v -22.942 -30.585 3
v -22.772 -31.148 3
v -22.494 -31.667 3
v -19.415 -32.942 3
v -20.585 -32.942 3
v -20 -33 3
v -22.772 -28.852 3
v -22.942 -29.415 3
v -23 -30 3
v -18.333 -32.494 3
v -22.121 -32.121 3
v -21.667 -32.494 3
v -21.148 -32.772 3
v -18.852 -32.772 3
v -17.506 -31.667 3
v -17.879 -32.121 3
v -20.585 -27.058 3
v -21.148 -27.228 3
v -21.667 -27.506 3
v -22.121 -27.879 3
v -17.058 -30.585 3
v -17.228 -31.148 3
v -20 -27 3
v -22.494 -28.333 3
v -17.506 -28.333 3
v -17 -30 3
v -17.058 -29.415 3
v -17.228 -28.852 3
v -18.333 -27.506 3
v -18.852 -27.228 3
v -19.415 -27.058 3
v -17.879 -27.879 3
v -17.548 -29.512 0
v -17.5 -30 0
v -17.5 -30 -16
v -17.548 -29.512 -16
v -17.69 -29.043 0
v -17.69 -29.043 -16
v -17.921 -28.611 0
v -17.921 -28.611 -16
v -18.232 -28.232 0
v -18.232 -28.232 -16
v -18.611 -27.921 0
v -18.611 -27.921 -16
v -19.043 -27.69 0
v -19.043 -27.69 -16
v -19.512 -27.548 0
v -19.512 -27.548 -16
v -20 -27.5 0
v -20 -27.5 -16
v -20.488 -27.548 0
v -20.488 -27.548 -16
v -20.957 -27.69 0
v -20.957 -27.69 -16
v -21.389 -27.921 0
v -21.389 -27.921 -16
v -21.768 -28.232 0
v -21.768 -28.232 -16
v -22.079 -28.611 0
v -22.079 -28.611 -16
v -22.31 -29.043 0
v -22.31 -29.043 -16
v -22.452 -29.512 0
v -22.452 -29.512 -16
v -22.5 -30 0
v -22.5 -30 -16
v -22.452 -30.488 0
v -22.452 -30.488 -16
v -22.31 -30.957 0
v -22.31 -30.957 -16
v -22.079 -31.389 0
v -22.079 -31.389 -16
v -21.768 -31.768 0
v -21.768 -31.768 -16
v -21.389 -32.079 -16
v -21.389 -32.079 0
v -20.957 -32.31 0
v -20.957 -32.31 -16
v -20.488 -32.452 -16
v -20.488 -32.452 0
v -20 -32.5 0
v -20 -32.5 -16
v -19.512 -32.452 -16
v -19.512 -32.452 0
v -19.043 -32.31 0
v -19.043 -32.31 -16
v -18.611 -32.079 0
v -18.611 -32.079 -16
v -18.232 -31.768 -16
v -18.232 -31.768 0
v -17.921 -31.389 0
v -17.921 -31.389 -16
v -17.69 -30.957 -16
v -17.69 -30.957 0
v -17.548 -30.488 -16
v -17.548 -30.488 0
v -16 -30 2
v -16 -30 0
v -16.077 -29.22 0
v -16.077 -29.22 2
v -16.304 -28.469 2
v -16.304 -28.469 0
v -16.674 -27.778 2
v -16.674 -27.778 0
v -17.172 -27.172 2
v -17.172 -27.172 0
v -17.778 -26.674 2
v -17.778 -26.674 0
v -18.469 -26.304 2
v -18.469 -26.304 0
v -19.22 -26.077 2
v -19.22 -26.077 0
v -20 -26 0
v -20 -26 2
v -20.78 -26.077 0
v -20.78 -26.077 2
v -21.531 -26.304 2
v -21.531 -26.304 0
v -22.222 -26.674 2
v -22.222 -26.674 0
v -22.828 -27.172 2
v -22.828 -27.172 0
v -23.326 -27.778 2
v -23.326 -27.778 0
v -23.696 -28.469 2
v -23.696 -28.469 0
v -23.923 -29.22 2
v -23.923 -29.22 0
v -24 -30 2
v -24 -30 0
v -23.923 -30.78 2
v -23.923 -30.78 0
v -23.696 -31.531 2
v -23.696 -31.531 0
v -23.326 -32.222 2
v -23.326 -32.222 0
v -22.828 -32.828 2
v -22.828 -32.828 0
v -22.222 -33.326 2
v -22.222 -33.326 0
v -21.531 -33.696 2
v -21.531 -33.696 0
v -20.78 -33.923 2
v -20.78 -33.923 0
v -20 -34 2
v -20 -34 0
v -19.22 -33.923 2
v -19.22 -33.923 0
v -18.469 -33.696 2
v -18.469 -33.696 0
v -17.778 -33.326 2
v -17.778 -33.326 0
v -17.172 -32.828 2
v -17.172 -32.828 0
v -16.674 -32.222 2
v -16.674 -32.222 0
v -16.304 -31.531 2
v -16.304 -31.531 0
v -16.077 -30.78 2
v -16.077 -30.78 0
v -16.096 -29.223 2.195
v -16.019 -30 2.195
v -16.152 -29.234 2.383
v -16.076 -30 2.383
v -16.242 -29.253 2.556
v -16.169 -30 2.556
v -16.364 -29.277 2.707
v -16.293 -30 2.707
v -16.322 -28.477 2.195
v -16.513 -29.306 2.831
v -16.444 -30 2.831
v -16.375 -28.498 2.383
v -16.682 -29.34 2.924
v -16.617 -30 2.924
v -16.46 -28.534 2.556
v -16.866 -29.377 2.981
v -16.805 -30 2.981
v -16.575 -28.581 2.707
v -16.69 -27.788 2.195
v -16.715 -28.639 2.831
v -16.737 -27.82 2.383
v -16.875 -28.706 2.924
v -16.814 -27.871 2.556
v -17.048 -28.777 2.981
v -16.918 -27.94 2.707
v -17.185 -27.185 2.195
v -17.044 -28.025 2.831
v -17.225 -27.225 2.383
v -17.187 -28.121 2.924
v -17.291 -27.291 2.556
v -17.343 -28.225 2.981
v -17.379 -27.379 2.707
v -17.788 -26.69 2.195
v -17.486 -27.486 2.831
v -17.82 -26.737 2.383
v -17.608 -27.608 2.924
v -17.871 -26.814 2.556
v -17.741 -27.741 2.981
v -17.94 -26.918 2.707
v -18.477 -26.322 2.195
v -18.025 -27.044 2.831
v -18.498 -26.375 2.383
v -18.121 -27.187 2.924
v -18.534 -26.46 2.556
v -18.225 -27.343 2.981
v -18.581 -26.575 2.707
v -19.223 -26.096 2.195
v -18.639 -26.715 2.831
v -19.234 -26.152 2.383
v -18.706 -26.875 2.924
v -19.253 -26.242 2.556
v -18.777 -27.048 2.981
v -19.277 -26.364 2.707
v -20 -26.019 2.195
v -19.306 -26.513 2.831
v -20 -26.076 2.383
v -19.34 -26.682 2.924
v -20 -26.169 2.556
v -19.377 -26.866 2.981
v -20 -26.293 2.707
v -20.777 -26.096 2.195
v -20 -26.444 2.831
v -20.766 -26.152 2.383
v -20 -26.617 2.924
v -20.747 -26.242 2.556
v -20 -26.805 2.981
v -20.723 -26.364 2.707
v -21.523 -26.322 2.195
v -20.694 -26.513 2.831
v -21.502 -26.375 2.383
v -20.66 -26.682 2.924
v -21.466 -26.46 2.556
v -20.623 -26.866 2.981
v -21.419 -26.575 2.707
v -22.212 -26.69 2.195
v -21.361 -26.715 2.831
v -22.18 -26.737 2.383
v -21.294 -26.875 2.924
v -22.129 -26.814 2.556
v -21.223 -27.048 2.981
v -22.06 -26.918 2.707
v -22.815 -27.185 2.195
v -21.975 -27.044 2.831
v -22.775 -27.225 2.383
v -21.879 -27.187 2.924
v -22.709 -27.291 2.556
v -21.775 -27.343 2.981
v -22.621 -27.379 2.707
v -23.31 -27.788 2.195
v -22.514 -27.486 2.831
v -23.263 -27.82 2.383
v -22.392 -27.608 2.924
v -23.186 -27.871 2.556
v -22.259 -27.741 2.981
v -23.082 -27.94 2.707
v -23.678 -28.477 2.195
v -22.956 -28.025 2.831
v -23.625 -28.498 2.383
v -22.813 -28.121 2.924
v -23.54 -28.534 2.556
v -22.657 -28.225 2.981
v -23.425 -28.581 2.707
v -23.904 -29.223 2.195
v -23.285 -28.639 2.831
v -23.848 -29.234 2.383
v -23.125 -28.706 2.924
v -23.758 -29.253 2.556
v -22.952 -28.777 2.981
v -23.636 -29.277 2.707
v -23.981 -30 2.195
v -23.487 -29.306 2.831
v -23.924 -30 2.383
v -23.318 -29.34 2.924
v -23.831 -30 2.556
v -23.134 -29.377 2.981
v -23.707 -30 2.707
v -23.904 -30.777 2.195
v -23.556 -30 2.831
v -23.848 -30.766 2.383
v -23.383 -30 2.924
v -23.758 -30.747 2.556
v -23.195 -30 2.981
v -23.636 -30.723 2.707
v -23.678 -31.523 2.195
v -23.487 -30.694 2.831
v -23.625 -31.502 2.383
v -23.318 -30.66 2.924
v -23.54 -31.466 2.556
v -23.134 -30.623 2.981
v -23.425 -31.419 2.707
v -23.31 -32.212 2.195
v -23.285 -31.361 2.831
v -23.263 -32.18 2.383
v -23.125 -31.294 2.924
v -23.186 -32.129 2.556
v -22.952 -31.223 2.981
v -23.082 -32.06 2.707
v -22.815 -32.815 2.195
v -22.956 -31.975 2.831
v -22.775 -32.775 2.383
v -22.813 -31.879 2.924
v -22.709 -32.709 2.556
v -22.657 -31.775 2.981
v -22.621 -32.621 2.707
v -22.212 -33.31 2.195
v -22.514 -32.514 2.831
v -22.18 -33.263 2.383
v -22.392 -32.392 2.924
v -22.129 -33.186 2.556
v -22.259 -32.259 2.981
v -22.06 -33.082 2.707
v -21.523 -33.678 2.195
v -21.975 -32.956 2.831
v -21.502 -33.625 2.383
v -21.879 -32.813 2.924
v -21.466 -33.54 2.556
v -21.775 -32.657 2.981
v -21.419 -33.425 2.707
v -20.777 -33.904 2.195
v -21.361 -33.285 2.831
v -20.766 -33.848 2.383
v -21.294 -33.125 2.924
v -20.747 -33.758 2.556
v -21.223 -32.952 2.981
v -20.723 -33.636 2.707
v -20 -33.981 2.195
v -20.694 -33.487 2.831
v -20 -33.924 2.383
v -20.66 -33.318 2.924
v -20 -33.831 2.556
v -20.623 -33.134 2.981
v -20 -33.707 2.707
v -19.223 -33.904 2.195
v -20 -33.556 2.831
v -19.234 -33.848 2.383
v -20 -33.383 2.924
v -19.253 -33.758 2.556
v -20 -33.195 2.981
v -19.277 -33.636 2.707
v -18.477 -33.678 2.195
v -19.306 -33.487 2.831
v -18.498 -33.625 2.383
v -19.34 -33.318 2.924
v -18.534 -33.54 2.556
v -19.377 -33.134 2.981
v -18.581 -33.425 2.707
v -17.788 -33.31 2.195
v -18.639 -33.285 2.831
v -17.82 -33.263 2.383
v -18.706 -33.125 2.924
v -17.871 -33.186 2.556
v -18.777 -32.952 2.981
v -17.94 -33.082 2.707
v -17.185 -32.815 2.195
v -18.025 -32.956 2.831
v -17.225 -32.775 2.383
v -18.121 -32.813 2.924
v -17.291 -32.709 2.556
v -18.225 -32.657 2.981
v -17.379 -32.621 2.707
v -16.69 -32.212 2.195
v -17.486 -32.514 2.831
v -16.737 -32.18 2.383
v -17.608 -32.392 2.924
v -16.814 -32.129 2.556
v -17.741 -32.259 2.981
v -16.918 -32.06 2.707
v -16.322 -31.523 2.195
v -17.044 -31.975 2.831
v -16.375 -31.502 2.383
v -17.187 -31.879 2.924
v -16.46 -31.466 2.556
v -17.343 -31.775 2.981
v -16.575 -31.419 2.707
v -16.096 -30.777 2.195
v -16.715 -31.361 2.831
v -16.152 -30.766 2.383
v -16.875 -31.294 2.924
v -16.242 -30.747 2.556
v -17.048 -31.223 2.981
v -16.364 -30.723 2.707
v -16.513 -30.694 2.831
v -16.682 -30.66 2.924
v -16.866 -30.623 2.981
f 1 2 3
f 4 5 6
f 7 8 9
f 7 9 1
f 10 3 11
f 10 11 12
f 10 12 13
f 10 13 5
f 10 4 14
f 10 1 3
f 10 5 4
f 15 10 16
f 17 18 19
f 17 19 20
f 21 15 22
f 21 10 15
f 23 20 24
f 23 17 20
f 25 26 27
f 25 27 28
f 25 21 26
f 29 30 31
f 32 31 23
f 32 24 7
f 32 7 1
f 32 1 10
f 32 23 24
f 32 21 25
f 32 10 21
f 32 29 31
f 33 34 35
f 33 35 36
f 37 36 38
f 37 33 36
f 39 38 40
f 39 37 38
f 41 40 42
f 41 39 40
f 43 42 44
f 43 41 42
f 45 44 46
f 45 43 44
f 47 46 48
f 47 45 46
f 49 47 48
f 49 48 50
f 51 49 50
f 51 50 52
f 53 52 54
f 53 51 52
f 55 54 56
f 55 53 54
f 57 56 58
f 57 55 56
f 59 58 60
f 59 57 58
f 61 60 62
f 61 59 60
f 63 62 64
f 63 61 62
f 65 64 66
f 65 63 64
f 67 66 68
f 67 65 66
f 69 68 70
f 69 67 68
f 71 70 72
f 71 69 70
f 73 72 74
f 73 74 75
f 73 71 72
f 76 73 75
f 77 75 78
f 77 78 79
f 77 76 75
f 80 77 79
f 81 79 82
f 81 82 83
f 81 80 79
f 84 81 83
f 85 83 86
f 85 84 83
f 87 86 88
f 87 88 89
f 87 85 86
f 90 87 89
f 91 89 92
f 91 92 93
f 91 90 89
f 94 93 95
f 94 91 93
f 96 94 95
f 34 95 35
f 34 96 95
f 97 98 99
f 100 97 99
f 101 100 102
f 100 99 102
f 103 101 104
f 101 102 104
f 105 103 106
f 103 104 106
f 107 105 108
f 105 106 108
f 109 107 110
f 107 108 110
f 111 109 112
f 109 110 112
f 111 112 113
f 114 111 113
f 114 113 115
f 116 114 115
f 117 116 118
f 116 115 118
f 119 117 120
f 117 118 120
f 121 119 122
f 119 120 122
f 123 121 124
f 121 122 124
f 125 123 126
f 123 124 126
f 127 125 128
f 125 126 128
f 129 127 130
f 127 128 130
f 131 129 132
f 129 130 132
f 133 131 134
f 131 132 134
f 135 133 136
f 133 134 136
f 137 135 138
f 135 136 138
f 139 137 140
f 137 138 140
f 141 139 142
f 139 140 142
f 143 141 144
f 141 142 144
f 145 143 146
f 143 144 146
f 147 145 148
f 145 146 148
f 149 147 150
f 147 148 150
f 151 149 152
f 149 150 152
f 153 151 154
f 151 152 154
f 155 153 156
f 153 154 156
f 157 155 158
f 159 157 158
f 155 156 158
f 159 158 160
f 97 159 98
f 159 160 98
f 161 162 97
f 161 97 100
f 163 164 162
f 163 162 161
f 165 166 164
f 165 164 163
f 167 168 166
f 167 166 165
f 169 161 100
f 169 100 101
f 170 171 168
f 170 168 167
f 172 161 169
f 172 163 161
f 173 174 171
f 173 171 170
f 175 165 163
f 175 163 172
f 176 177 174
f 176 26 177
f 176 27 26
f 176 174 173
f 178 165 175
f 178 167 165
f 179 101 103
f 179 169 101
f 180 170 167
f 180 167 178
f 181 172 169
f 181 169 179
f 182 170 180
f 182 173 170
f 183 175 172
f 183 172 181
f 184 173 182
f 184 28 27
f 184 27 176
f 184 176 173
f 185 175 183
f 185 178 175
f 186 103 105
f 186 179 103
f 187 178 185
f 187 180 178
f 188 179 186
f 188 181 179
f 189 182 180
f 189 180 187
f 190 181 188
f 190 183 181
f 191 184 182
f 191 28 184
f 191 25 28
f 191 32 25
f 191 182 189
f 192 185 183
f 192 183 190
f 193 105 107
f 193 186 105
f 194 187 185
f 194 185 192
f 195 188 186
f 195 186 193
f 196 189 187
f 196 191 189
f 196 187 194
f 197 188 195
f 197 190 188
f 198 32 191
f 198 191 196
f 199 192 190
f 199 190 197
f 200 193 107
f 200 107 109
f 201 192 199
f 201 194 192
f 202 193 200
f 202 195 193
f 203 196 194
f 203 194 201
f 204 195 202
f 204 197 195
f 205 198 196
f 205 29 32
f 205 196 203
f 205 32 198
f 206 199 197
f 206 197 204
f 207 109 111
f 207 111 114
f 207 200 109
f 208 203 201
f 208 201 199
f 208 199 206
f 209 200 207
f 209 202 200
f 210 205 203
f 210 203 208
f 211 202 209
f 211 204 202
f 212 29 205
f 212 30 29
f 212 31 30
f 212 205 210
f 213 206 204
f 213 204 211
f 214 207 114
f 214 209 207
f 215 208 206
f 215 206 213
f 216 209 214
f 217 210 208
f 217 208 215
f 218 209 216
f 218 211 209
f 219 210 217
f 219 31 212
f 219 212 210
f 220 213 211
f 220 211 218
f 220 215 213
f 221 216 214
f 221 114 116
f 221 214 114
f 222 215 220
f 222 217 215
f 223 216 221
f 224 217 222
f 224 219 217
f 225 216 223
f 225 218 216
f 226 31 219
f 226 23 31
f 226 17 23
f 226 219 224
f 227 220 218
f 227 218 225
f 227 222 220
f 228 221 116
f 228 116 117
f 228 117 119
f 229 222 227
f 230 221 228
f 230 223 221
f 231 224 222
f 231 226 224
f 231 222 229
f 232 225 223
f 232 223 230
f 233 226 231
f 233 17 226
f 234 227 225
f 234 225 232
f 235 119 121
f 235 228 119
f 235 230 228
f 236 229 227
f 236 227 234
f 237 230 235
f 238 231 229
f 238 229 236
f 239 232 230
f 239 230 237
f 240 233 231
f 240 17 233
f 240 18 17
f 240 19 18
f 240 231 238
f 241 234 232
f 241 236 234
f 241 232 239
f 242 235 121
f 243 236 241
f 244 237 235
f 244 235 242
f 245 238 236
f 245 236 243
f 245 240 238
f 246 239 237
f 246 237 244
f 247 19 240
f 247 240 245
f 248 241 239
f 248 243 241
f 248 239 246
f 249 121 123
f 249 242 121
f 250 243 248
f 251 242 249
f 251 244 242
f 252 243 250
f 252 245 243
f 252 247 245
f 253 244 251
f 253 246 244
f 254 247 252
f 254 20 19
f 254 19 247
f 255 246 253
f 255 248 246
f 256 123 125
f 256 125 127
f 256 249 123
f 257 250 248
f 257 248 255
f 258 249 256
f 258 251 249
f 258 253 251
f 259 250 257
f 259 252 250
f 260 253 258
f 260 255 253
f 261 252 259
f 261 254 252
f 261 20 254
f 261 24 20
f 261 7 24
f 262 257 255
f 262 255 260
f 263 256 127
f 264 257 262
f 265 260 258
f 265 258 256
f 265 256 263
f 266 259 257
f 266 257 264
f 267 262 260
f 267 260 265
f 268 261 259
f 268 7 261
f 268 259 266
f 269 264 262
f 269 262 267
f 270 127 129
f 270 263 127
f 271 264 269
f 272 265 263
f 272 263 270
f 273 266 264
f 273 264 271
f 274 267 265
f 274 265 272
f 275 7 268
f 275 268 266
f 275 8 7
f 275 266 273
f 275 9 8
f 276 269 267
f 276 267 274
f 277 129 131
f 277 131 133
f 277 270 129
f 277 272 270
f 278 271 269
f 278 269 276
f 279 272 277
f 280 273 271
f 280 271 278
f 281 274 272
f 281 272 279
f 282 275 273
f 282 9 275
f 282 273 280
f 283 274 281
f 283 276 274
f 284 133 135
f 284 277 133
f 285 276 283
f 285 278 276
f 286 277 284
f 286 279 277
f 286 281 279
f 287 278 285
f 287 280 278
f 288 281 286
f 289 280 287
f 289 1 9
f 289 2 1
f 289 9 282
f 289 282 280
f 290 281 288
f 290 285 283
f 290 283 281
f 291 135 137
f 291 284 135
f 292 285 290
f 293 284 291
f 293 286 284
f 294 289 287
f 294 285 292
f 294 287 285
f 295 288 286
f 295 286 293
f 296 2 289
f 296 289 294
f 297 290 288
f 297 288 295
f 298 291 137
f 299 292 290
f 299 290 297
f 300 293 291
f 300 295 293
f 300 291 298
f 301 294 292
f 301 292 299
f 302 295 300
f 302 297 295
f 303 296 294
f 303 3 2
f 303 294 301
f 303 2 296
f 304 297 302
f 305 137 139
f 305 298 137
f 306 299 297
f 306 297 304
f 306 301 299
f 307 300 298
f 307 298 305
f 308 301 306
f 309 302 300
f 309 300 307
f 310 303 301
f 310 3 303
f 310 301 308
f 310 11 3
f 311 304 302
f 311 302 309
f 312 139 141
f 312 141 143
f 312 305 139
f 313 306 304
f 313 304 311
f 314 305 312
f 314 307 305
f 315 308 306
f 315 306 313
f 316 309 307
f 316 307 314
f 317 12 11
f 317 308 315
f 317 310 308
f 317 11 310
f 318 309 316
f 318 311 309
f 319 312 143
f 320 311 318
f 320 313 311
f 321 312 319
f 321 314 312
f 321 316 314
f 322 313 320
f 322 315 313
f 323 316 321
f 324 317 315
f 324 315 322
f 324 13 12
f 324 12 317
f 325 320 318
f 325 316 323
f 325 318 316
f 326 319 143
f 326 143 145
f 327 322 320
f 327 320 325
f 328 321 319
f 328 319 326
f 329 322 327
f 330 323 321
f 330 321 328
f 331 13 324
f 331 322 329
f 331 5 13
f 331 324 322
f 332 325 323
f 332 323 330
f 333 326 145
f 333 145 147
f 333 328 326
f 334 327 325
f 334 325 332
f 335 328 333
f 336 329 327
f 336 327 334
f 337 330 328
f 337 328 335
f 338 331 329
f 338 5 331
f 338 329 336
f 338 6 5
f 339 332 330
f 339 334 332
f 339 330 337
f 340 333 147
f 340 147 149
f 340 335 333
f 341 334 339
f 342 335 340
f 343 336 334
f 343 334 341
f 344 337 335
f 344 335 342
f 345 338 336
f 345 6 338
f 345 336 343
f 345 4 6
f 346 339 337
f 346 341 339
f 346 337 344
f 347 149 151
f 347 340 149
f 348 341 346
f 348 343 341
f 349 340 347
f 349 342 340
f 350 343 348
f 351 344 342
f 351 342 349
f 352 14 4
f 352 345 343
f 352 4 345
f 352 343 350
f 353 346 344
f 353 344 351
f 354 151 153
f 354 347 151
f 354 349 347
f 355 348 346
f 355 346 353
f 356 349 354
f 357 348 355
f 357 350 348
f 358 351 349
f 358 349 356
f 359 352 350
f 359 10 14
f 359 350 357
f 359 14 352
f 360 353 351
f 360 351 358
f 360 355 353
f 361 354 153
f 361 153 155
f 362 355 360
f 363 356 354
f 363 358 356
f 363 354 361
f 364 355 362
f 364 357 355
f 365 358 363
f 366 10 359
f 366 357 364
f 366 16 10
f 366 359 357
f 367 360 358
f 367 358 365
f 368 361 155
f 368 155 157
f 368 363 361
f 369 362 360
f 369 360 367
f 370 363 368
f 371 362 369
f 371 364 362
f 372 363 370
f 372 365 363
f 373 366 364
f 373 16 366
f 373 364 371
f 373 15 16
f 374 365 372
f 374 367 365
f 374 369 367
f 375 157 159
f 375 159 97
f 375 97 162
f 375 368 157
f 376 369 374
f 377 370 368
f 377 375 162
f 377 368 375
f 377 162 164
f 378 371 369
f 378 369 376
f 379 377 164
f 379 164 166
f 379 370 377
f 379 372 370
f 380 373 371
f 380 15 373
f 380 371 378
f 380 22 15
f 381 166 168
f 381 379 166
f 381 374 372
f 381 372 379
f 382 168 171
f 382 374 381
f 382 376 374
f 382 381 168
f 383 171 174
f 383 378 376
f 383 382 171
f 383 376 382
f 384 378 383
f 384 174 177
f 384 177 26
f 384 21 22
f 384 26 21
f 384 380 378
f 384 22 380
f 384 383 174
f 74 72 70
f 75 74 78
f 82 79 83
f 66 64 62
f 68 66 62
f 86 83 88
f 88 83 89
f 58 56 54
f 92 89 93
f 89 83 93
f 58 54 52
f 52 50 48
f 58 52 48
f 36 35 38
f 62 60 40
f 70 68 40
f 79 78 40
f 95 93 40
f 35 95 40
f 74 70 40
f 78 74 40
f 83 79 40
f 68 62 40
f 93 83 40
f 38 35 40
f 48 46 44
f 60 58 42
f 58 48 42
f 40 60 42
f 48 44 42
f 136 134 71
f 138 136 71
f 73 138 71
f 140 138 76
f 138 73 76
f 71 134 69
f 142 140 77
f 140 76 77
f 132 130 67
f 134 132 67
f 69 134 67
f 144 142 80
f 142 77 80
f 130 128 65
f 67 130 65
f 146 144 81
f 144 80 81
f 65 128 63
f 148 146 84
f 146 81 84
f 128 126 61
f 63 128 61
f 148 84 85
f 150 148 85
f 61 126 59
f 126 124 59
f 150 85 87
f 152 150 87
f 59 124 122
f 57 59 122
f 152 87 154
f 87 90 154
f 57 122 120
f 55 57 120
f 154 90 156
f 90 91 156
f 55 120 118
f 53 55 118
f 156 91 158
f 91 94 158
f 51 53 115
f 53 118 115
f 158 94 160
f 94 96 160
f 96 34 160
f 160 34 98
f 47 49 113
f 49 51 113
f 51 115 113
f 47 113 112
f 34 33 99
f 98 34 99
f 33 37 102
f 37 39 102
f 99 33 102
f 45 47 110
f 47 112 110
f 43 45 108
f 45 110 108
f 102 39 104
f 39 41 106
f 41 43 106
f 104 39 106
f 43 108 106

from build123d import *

# Parameters (mm, degrees)
SKETCH1_R           = 2.5
BOSS_EXTRUDE1_DEPTH = 16
SKETCH2_R           = 4
BOSS_EXTRUDE2_DEPTH = 3
FILLET1_R           = 1


with BuildPart() as part:
    # Sketch1 → Boss-Extrude1 (new body)
    with BuildSketch(Plane.XY):
        with Locations((-20, -30)):
            Circle(SKETCH1_R)
    extrude(amount=-BOSS_EXTRUDE1_DEPTH)

    # Sketch2 → Boss-Extrude2 (add)
    with BuildSketch(Plane.XY):
        with Locations((-20, -30)):
            Circle(SKETCH2_R)
    extrude(amount=BOSS_EXTRUDE2_DEPTH)

    # Fillet1
    fillet1_edges = [part.edges().sort_by_distance(p)[0] for p in [
        (-24, -30, 3),
    ]]
    fillet(fillet1_edges, radius=FILLET1_R)


solid = part.part
